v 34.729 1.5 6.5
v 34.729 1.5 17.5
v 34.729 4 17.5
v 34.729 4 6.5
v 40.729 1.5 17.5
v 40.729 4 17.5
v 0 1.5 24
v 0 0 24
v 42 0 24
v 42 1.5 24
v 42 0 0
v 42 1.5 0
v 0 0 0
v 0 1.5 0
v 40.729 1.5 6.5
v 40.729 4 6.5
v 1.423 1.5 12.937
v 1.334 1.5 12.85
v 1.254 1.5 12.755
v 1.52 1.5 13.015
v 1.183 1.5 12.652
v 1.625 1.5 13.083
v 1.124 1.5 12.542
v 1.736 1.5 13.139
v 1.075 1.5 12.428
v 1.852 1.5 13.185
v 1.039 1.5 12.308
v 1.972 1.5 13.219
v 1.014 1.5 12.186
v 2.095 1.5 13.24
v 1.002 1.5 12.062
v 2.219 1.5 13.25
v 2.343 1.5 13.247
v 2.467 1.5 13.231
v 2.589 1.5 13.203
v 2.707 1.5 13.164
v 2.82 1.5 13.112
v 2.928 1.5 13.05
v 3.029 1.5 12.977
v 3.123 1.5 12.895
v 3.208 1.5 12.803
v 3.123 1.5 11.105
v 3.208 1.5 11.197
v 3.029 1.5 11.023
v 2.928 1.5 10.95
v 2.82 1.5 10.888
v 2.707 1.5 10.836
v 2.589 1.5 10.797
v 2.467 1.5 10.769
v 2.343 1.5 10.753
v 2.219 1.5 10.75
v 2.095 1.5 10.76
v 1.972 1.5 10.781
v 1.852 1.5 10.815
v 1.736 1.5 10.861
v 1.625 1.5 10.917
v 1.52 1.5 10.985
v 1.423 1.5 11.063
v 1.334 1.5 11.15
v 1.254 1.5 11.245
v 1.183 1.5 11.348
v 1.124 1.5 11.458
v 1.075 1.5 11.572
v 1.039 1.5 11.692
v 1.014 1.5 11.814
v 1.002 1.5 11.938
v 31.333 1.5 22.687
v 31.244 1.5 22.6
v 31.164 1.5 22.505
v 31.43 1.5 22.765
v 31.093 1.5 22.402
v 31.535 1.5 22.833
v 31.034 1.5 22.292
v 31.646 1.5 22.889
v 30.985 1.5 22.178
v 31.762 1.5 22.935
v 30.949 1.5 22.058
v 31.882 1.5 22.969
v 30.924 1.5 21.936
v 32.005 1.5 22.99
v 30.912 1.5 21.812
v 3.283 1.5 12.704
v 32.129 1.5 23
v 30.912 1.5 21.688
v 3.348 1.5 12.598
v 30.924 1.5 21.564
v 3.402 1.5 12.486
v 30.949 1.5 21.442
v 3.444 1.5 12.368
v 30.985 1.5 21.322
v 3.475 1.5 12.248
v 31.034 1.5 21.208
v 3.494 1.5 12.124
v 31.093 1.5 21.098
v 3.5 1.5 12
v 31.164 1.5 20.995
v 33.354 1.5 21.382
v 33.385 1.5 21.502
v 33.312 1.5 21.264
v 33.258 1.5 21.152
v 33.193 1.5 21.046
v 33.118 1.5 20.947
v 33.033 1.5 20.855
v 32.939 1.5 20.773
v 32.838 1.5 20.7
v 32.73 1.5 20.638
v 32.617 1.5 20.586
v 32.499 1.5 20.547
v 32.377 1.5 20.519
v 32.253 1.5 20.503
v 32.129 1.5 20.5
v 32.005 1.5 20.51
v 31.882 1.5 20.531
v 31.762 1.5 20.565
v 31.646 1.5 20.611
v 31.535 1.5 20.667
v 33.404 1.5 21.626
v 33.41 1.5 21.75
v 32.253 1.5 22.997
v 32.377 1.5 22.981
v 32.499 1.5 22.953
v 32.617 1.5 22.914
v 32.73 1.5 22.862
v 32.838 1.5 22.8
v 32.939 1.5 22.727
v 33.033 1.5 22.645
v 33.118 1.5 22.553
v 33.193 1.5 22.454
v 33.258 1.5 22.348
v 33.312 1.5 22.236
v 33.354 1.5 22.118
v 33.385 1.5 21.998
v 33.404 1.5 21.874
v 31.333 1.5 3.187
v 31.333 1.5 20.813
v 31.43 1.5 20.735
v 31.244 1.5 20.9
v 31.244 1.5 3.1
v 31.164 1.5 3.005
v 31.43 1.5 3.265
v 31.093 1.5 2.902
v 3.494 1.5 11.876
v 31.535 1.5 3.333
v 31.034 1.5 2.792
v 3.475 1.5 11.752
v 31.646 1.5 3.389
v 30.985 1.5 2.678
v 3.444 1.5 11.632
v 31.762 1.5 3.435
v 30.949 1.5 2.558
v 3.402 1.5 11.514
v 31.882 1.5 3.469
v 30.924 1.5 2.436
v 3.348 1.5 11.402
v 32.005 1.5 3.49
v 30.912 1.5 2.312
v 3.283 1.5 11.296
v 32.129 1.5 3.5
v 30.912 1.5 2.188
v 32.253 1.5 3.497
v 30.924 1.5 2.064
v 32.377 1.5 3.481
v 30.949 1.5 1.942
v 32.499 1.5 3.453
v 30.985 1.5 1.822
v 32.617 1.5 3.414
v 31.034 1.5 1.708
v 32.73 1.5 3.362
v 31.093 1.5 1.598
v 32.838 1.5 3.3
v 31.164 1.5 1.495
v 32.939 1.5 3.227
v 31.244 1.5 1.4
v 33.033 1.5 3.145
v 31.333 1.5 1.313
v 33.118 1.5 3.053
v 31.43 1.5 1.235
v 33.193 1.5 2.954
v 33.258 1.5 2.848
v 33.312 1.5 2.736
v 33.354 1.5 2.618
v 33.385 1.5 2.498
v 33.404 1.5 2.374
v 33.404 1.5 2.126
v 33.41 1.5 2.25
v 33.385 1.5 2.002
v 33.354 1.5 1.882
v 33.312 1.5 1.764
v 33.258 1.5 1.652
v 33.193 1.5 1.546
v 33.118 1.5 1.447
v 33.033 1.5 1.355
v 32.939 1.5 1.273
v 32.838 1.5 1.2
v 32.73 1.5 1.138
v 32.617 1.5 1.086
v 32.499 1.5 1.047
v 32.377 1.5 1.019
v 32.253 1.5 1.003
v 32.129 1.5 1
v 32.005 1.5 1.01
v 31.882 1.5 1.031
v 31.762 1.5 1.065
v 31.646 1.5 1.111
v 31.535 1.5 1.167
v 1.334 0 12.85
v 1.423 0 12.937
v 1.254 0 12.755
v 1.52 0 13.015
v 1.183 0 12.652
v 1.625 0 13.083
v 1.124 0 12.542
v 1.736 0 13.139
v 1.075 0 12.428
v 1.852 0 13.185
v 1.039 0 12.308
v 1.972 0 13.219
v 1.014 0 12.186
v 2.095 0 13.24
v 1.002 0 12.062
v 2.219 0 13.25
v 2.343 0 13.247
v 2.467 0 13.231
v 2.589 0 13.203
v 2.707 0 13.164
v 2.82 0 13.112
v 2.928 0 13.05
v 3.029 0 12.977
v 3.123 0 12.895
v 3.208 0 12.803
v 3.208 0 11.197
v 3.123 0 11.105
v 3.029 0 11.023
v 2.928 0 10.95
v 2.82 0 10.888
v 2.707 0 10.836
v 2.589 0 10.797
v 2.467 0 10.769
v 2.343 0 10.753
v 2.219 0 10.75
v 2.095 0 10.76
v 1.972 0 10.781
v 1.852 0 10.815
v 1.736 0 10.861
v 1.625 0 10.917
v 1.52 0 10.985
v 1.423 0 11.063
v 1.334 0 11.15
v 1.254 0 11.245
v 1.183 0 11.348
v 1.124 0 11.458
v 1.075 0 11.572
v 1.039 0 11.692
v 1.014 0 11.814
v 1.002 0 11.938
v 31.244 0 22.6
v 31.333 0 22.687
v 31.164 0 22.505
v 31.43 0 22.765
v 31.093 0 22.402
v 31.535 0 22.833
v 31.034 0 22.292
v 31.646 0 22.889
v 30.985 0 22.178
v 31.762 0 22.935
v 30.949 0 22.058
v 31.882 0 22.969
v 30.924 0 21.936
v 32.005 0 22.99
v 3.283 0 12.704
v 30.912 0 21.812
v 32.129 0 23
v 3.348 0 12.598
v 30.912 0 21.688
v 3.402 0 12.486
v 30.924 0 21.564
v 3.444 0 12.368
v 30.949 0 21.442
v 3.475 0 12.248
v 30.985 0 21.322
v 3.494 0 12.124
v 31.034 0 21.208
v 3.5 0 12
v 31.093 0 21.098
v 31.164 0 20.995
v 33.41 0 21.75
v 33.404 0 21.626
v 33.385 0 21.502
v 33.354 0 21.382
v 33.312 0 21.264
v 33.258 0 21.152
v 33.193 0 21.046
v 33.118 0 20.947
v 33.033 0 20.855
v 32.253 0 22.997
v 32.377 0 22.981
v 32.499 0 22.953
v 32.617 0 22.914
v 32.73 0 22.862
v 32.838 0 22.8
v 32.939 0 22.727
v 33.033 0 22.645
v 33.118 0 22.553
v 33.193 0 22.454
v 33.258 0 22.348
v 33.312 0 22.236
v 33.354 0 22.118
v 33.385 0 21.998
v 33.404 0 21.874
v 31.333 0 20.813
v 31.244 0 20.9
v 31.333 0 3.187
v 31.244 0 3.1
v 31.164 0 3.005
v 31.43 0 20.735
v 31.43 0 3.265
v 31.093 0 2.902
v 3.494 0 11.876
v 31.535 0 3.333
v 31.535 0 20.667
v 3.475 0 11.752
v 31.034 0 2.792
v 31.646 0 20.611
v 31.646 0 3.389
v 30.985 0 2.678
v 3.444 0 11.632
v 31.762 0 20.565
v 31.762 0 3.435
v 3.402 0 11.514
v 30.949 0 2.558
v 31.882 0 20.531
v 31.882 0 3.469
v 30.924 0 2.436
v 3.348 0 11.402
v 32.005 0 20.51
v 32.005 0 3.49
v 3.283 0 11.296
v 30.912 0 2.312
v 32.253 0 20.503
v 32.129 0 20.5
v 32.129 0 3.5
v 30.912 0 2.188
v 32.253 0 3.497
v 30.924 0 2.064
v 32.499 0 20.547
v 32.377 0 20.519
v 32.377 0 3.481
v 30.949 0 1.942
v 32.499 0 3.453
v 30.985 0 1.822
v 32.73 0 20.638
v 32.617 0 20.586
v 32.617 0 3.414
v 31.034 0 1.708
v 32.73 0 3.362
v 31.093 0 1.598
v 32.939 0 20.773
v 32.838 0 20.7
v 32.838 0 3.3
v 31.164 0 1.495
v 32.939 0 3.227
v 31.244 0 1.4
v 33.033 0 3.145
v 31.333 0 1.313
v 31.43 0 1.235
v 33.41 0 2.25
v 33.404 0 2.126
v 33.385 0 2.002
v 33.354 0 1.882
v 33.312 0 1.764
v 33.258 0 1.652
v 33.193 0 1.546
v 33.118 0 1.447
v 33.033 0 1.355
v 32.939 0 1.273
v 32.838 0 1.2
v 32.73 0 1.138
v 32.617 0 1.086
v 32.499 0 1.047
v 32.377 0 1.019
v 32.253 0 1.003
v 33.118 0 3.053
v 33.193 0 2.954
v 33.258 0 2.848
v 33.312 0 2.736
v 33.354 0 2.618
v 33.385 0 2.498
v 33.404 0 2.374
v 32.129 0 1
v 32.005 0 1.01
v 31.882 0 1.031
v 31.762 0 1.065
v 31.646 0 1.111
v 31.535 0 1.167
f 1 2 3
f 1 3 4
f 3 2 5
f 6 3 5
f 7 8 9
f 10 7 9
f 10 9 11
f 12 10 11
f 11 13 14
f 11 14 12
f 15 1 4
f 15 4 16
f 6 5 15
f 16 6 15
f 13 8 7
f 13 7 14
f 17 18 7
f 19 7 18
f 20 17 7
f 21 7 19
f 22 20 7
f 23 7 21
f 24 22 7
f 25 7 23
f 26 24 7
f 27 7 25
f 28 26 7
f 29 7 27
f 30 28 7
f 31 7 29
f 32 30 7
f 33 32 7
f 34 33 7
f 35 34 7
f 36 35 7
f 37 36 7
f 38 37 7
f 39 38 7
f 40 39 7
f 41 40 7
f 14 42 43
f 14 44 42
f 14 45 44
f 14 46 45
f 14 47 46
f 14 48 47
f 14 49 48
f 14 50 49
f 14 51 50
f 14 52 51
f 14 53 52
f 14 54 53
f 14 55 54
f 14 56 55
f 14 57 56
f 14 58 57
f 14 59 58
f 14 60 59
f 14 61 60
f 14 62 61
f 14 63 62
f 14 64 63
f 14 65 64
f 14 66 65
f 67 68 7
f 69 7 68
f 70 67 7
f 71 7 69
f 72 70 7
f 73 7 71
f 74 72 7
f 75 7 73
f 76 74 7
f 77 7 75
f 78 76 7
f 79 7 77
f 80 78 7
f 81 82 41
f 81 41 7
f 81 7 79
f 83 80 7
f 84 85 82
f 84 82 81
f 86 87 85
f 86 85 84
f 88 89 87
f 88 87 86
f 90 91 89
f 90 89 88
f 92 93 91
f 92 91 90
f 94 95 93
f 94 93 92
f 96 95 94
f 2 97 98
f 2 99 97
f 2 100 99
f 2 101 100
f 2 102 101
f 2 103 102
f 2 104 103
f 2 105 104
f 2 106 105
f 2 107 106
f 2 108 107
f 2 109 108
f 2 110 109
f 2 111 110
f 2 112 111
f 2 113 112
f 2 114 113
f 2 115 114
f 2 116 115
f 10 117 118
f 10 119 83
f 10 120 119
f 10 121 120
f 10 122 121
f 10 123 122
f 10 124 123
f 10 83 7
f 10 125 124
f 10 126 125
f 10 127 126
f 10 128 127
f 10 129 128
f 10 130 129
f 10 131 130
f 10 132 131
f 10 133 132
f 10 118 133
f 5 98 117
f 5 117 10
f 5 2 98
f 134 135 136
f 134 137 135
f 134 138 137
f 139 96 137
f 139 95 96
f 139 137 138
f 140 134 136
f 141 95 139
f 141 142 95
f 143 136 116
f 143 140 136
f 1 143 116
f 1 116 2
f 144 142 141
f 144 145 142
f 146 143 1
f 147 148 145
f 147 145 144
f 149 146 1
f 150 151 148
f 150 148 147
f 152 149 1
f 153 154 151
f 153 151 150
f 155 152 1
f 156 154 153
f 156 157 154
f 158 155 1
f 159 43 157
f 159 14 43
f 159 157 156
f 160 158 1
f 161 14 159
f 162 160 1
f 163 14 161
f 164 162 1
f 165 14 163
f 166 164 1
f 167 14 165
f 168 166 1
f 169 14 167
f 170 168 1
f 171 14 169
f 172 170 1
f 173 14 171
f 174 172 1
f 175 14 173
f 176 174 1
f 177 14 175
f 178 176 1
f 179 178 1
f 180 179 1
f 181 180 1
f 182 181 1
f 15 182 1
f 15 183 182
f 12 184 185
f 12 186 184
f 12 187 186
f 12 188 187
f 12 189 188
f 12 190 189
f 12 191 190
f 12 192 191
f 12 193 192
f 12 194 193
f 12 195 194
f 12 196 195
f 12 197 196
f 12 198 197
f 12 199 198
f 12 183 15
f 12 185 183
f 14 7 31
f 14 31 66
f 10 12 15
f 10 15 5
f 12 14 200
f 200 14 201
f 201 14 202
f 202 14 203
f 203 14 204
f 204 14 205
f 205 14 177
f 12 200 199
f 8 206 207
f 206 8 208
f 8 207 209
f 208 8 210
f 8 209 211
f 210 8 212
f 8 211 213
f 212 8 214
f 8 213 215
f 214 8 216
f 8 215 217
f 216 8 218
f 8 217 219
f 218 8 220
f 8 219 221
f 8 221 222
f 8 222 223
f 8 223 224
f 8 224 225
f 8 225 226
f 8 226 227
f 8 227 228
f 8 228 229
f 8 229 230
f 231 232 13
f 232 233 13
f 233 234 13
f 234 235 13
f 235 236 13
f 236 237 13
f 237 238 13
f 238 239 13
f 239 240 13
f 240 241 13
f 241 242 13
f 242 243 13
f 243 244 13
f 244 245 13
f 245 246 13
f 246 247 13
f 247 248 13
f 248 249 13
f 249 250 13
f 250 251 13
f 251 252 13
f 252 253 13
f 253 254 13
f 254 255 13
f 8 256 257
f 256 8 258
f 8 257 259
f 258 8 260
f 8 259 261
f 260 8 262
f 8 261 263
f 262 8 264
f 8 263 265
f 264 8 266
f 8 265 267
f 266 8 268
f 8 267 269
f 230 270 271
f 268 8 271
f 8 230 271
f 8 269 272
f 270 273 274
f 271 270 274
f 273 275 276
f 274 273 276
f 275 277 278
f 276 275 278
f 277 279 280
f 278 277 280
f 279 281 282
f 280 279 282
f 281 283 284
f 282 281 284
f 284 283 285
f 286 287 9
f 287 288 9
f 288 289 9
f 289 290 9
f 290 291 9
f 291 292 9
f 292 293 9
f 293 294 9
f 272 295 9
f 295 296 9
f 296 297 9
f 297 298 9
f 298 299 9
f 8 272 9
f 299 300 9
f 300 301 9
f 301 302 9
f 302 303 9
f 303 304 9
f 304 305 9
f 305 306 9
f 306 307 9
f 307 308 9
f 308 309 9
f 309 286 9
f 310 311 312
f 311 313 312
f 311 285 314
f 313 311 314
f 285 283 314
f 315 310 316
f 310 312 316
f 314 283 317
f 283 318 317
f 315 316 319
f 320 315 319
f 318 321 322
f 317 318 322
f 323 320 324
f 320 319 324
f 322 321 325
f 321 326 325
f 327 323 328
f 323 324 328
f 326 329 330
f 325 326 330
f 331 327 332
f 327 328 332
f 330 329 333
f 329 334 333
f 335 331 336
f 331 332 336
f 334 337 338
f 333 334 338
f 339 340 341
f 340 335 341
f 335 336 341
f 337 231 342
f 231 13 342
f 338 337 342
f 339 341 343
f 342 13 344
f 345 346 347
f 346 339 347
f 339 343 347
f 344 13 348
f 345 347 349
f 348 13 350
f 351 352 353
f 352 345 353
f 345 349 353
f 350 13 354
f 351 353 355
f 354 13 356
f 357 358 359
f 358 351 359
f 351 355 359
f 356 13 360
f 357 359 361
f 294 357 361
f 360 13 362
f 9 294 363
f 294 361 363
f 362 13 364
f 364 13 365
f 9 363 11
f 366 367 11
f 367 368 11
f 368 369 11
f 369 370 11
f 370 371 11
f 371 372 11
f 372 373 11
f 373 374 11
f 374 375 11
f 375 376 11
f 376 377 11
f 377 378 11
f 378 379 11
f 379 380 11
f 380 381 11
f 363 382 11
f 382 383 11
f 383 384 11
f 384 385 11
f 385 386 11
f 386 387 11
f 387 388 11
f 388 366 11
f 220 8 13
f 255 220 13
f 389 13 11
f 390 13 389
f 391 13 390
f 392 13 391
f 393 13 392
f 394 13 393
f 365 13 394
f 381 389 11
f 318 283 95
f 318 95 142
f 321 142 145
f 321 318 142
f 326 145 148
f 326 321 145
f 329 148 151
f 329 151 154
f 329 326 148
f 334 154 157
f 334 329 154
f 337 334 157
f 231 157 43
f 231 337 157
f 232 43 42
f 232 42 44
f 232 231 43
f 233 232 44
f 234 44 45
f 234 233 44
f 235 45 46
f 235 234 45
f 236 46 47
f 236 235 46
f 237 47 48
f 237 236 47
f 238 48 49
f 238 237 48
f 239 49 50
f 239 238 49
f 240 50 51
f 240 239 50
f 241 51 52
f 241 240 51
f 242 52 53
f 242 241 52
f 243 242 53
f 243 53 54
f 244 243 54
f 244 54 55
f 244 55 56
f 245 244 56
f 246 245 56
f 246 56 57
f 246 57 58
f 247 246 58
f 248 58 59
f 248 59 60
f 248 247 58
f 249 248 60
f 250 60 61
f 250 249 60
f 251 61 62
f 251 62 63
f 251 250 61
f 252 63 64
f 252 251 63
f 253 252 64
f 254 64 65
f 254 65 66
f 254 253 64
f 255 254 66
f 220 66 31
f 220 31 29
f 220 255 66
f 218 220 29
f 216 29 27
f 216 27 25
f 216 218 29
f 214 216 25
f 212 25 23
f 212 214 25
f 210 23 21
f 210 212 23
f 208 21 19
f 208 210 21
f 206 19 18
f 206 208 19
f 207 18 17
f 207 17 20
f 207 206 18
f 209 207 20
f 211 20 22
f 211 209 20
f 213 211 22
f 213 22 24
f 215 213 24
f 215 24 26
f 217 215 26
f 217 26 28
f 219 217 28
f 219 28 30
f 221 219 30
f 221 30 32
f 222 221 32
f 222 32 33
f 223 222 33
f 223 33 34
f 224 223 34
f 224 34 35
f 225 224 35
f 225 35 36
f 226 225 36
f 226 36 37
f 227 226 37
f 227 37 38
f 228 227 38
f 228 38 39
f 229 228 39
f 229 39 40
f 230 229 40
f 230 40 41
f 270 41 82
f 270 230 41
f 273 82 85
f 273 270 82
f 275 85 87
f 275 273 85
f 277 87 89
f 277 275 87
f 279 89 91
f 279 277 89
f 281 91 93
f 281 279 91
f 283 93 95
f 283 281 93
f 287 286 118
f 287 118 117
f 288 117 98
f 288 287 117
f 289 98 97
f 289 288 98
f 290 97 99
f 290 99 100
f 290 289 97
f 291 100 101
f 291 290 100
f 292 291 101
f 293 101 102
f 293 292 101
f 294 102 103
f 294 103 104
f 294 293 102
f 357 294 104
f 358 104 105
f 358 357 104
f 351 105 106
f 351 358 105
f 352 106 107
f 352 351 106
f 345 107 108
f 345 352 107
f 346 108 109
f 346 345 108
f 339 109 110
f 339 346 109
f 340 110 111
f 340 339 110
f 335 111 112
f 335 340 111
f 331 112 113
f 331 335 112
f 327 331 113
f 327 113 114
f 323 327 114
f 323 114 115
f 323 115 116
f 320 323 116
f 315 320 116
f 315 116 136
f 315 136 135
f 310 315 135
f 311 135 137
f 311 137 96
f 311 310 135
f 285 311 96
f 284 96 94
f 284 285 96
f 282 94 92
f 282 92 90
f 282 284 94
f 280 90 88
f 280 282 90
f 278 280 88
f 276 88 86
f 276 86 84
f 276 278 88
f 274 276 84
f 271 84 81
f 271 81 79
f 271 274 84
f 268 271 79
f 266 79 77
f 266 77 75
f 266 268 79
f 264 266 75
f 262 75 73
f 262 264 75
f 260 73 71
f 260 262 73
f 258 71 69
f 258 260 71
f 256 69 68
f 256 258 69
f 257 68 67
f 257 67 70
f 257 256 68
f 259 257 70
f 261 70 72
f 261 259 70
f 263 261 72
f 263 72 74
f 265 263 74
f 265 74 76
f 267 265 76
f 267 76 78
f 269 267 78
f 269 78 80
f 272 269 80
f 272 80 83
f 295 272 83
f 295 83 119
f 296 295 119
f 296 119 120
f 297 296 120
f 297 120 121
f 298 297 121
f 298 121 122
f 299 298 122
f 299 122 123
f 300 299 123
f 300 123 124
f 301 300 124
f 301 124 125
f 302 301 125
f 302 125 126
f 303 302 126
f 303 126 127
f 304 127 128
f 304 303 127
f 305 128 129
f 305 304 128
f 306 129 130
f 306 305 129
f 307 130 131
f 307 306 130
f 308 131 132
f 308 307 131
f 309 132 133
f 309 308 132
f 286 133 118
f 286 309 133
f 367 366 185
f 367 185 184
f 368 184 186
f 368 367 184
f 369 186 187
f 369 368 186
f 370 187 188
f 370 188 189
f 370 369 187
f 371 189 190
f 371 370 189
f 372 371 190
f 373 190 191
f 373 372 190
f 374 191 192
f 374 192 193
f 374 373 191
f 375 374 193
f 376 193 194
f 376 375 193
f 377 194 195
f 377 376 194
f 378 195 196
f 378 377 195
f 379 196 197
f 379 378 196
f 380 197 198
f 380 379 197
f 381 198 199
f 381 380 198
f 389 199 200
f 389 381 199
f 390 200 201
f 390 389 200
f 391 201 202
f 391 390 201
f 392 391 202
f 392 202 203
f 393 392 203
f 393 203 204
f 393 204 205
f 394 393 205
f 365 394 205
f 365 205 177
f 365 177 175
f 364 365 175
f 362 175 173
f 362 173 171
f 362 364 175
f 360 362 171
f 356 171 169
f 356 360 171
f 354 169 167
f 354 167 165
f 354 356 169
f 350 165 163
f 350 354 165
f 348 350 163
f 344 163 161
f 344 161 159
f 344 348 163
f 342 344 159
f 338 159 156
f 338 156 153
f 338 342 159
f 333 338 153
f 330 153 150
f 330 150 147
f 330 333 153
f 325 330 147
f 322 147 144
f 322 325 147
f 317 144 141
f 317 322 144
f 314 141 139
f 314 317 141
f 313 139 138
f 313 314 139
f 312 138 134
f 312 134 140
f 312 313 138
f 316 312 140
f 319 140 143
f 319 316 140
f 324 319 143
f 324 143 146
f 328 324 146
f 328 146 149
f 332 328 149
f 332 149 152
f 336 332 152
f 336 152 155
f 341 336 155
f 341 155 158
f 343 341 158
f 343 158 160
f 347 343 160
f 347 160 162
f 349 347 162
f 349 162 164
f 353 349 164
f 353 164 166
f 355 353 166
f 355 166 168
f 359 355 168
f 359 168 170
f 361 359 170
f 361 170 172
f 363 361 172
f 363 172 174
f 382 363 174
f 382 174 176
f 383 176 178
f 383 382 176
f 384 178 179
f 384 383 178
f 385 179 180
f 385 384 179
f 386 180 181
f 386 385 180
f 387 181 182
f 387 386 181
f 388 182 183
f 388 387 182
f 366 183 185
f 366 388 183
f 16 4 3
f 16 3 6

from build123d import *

# Parameters (mm, degrees)
SKETCH2_W           = 42
SKETCH2_H           = 24
SKETCH2_R           = 1.25
BOSS_EXTRUDE1_DEPTH = 1.5
SKETCH2_9_W         = 6
SKETCH2_9_H         = 11
BOSS_EXTRUDE2_DEPTH = 4


with BuildPart() as part:
    # Sketch2 → Boss-Extrude1 (new body)
    with BuildSketch(Plane(origin=(0, 0, 0), x_dir=(1, 0, 0), z_dir=(0, 1, 0))):
        with Locations((21, -12)):
            Rectangle(SKETCH2_W, SKETCH2_H)
        with Locations((32.16, -2.25)):
            Circle(SKETCH2_R, mode=Mode.SUBTRACT)
        with Locations((32.16, -21.75)):
            Circle(SKETCH2_R, mode=Mode.SUBTRACT)
        with Locations((2.25, -12)):
            Circle(SKETCH2_R, mode=Mode.SUBTRACT)
    extrude(amount=BOSS_EXTRUDE1_DEPTH)

    # Sketch2<9> → Boss-Extrude2 (add)
    with BuildSketch(Plane(origin=(0, 0, 0), x_dir=(1, 0, 0), z_dir=(0, 1, 0))):
        with Locations((37.7285084, -12)):
            Rectangle(SKETCH2_9_W, SKETCH2_9_H)
    extrude(amount=BOSS_EXTRUDE2_DEPTH)


solid = part.part
